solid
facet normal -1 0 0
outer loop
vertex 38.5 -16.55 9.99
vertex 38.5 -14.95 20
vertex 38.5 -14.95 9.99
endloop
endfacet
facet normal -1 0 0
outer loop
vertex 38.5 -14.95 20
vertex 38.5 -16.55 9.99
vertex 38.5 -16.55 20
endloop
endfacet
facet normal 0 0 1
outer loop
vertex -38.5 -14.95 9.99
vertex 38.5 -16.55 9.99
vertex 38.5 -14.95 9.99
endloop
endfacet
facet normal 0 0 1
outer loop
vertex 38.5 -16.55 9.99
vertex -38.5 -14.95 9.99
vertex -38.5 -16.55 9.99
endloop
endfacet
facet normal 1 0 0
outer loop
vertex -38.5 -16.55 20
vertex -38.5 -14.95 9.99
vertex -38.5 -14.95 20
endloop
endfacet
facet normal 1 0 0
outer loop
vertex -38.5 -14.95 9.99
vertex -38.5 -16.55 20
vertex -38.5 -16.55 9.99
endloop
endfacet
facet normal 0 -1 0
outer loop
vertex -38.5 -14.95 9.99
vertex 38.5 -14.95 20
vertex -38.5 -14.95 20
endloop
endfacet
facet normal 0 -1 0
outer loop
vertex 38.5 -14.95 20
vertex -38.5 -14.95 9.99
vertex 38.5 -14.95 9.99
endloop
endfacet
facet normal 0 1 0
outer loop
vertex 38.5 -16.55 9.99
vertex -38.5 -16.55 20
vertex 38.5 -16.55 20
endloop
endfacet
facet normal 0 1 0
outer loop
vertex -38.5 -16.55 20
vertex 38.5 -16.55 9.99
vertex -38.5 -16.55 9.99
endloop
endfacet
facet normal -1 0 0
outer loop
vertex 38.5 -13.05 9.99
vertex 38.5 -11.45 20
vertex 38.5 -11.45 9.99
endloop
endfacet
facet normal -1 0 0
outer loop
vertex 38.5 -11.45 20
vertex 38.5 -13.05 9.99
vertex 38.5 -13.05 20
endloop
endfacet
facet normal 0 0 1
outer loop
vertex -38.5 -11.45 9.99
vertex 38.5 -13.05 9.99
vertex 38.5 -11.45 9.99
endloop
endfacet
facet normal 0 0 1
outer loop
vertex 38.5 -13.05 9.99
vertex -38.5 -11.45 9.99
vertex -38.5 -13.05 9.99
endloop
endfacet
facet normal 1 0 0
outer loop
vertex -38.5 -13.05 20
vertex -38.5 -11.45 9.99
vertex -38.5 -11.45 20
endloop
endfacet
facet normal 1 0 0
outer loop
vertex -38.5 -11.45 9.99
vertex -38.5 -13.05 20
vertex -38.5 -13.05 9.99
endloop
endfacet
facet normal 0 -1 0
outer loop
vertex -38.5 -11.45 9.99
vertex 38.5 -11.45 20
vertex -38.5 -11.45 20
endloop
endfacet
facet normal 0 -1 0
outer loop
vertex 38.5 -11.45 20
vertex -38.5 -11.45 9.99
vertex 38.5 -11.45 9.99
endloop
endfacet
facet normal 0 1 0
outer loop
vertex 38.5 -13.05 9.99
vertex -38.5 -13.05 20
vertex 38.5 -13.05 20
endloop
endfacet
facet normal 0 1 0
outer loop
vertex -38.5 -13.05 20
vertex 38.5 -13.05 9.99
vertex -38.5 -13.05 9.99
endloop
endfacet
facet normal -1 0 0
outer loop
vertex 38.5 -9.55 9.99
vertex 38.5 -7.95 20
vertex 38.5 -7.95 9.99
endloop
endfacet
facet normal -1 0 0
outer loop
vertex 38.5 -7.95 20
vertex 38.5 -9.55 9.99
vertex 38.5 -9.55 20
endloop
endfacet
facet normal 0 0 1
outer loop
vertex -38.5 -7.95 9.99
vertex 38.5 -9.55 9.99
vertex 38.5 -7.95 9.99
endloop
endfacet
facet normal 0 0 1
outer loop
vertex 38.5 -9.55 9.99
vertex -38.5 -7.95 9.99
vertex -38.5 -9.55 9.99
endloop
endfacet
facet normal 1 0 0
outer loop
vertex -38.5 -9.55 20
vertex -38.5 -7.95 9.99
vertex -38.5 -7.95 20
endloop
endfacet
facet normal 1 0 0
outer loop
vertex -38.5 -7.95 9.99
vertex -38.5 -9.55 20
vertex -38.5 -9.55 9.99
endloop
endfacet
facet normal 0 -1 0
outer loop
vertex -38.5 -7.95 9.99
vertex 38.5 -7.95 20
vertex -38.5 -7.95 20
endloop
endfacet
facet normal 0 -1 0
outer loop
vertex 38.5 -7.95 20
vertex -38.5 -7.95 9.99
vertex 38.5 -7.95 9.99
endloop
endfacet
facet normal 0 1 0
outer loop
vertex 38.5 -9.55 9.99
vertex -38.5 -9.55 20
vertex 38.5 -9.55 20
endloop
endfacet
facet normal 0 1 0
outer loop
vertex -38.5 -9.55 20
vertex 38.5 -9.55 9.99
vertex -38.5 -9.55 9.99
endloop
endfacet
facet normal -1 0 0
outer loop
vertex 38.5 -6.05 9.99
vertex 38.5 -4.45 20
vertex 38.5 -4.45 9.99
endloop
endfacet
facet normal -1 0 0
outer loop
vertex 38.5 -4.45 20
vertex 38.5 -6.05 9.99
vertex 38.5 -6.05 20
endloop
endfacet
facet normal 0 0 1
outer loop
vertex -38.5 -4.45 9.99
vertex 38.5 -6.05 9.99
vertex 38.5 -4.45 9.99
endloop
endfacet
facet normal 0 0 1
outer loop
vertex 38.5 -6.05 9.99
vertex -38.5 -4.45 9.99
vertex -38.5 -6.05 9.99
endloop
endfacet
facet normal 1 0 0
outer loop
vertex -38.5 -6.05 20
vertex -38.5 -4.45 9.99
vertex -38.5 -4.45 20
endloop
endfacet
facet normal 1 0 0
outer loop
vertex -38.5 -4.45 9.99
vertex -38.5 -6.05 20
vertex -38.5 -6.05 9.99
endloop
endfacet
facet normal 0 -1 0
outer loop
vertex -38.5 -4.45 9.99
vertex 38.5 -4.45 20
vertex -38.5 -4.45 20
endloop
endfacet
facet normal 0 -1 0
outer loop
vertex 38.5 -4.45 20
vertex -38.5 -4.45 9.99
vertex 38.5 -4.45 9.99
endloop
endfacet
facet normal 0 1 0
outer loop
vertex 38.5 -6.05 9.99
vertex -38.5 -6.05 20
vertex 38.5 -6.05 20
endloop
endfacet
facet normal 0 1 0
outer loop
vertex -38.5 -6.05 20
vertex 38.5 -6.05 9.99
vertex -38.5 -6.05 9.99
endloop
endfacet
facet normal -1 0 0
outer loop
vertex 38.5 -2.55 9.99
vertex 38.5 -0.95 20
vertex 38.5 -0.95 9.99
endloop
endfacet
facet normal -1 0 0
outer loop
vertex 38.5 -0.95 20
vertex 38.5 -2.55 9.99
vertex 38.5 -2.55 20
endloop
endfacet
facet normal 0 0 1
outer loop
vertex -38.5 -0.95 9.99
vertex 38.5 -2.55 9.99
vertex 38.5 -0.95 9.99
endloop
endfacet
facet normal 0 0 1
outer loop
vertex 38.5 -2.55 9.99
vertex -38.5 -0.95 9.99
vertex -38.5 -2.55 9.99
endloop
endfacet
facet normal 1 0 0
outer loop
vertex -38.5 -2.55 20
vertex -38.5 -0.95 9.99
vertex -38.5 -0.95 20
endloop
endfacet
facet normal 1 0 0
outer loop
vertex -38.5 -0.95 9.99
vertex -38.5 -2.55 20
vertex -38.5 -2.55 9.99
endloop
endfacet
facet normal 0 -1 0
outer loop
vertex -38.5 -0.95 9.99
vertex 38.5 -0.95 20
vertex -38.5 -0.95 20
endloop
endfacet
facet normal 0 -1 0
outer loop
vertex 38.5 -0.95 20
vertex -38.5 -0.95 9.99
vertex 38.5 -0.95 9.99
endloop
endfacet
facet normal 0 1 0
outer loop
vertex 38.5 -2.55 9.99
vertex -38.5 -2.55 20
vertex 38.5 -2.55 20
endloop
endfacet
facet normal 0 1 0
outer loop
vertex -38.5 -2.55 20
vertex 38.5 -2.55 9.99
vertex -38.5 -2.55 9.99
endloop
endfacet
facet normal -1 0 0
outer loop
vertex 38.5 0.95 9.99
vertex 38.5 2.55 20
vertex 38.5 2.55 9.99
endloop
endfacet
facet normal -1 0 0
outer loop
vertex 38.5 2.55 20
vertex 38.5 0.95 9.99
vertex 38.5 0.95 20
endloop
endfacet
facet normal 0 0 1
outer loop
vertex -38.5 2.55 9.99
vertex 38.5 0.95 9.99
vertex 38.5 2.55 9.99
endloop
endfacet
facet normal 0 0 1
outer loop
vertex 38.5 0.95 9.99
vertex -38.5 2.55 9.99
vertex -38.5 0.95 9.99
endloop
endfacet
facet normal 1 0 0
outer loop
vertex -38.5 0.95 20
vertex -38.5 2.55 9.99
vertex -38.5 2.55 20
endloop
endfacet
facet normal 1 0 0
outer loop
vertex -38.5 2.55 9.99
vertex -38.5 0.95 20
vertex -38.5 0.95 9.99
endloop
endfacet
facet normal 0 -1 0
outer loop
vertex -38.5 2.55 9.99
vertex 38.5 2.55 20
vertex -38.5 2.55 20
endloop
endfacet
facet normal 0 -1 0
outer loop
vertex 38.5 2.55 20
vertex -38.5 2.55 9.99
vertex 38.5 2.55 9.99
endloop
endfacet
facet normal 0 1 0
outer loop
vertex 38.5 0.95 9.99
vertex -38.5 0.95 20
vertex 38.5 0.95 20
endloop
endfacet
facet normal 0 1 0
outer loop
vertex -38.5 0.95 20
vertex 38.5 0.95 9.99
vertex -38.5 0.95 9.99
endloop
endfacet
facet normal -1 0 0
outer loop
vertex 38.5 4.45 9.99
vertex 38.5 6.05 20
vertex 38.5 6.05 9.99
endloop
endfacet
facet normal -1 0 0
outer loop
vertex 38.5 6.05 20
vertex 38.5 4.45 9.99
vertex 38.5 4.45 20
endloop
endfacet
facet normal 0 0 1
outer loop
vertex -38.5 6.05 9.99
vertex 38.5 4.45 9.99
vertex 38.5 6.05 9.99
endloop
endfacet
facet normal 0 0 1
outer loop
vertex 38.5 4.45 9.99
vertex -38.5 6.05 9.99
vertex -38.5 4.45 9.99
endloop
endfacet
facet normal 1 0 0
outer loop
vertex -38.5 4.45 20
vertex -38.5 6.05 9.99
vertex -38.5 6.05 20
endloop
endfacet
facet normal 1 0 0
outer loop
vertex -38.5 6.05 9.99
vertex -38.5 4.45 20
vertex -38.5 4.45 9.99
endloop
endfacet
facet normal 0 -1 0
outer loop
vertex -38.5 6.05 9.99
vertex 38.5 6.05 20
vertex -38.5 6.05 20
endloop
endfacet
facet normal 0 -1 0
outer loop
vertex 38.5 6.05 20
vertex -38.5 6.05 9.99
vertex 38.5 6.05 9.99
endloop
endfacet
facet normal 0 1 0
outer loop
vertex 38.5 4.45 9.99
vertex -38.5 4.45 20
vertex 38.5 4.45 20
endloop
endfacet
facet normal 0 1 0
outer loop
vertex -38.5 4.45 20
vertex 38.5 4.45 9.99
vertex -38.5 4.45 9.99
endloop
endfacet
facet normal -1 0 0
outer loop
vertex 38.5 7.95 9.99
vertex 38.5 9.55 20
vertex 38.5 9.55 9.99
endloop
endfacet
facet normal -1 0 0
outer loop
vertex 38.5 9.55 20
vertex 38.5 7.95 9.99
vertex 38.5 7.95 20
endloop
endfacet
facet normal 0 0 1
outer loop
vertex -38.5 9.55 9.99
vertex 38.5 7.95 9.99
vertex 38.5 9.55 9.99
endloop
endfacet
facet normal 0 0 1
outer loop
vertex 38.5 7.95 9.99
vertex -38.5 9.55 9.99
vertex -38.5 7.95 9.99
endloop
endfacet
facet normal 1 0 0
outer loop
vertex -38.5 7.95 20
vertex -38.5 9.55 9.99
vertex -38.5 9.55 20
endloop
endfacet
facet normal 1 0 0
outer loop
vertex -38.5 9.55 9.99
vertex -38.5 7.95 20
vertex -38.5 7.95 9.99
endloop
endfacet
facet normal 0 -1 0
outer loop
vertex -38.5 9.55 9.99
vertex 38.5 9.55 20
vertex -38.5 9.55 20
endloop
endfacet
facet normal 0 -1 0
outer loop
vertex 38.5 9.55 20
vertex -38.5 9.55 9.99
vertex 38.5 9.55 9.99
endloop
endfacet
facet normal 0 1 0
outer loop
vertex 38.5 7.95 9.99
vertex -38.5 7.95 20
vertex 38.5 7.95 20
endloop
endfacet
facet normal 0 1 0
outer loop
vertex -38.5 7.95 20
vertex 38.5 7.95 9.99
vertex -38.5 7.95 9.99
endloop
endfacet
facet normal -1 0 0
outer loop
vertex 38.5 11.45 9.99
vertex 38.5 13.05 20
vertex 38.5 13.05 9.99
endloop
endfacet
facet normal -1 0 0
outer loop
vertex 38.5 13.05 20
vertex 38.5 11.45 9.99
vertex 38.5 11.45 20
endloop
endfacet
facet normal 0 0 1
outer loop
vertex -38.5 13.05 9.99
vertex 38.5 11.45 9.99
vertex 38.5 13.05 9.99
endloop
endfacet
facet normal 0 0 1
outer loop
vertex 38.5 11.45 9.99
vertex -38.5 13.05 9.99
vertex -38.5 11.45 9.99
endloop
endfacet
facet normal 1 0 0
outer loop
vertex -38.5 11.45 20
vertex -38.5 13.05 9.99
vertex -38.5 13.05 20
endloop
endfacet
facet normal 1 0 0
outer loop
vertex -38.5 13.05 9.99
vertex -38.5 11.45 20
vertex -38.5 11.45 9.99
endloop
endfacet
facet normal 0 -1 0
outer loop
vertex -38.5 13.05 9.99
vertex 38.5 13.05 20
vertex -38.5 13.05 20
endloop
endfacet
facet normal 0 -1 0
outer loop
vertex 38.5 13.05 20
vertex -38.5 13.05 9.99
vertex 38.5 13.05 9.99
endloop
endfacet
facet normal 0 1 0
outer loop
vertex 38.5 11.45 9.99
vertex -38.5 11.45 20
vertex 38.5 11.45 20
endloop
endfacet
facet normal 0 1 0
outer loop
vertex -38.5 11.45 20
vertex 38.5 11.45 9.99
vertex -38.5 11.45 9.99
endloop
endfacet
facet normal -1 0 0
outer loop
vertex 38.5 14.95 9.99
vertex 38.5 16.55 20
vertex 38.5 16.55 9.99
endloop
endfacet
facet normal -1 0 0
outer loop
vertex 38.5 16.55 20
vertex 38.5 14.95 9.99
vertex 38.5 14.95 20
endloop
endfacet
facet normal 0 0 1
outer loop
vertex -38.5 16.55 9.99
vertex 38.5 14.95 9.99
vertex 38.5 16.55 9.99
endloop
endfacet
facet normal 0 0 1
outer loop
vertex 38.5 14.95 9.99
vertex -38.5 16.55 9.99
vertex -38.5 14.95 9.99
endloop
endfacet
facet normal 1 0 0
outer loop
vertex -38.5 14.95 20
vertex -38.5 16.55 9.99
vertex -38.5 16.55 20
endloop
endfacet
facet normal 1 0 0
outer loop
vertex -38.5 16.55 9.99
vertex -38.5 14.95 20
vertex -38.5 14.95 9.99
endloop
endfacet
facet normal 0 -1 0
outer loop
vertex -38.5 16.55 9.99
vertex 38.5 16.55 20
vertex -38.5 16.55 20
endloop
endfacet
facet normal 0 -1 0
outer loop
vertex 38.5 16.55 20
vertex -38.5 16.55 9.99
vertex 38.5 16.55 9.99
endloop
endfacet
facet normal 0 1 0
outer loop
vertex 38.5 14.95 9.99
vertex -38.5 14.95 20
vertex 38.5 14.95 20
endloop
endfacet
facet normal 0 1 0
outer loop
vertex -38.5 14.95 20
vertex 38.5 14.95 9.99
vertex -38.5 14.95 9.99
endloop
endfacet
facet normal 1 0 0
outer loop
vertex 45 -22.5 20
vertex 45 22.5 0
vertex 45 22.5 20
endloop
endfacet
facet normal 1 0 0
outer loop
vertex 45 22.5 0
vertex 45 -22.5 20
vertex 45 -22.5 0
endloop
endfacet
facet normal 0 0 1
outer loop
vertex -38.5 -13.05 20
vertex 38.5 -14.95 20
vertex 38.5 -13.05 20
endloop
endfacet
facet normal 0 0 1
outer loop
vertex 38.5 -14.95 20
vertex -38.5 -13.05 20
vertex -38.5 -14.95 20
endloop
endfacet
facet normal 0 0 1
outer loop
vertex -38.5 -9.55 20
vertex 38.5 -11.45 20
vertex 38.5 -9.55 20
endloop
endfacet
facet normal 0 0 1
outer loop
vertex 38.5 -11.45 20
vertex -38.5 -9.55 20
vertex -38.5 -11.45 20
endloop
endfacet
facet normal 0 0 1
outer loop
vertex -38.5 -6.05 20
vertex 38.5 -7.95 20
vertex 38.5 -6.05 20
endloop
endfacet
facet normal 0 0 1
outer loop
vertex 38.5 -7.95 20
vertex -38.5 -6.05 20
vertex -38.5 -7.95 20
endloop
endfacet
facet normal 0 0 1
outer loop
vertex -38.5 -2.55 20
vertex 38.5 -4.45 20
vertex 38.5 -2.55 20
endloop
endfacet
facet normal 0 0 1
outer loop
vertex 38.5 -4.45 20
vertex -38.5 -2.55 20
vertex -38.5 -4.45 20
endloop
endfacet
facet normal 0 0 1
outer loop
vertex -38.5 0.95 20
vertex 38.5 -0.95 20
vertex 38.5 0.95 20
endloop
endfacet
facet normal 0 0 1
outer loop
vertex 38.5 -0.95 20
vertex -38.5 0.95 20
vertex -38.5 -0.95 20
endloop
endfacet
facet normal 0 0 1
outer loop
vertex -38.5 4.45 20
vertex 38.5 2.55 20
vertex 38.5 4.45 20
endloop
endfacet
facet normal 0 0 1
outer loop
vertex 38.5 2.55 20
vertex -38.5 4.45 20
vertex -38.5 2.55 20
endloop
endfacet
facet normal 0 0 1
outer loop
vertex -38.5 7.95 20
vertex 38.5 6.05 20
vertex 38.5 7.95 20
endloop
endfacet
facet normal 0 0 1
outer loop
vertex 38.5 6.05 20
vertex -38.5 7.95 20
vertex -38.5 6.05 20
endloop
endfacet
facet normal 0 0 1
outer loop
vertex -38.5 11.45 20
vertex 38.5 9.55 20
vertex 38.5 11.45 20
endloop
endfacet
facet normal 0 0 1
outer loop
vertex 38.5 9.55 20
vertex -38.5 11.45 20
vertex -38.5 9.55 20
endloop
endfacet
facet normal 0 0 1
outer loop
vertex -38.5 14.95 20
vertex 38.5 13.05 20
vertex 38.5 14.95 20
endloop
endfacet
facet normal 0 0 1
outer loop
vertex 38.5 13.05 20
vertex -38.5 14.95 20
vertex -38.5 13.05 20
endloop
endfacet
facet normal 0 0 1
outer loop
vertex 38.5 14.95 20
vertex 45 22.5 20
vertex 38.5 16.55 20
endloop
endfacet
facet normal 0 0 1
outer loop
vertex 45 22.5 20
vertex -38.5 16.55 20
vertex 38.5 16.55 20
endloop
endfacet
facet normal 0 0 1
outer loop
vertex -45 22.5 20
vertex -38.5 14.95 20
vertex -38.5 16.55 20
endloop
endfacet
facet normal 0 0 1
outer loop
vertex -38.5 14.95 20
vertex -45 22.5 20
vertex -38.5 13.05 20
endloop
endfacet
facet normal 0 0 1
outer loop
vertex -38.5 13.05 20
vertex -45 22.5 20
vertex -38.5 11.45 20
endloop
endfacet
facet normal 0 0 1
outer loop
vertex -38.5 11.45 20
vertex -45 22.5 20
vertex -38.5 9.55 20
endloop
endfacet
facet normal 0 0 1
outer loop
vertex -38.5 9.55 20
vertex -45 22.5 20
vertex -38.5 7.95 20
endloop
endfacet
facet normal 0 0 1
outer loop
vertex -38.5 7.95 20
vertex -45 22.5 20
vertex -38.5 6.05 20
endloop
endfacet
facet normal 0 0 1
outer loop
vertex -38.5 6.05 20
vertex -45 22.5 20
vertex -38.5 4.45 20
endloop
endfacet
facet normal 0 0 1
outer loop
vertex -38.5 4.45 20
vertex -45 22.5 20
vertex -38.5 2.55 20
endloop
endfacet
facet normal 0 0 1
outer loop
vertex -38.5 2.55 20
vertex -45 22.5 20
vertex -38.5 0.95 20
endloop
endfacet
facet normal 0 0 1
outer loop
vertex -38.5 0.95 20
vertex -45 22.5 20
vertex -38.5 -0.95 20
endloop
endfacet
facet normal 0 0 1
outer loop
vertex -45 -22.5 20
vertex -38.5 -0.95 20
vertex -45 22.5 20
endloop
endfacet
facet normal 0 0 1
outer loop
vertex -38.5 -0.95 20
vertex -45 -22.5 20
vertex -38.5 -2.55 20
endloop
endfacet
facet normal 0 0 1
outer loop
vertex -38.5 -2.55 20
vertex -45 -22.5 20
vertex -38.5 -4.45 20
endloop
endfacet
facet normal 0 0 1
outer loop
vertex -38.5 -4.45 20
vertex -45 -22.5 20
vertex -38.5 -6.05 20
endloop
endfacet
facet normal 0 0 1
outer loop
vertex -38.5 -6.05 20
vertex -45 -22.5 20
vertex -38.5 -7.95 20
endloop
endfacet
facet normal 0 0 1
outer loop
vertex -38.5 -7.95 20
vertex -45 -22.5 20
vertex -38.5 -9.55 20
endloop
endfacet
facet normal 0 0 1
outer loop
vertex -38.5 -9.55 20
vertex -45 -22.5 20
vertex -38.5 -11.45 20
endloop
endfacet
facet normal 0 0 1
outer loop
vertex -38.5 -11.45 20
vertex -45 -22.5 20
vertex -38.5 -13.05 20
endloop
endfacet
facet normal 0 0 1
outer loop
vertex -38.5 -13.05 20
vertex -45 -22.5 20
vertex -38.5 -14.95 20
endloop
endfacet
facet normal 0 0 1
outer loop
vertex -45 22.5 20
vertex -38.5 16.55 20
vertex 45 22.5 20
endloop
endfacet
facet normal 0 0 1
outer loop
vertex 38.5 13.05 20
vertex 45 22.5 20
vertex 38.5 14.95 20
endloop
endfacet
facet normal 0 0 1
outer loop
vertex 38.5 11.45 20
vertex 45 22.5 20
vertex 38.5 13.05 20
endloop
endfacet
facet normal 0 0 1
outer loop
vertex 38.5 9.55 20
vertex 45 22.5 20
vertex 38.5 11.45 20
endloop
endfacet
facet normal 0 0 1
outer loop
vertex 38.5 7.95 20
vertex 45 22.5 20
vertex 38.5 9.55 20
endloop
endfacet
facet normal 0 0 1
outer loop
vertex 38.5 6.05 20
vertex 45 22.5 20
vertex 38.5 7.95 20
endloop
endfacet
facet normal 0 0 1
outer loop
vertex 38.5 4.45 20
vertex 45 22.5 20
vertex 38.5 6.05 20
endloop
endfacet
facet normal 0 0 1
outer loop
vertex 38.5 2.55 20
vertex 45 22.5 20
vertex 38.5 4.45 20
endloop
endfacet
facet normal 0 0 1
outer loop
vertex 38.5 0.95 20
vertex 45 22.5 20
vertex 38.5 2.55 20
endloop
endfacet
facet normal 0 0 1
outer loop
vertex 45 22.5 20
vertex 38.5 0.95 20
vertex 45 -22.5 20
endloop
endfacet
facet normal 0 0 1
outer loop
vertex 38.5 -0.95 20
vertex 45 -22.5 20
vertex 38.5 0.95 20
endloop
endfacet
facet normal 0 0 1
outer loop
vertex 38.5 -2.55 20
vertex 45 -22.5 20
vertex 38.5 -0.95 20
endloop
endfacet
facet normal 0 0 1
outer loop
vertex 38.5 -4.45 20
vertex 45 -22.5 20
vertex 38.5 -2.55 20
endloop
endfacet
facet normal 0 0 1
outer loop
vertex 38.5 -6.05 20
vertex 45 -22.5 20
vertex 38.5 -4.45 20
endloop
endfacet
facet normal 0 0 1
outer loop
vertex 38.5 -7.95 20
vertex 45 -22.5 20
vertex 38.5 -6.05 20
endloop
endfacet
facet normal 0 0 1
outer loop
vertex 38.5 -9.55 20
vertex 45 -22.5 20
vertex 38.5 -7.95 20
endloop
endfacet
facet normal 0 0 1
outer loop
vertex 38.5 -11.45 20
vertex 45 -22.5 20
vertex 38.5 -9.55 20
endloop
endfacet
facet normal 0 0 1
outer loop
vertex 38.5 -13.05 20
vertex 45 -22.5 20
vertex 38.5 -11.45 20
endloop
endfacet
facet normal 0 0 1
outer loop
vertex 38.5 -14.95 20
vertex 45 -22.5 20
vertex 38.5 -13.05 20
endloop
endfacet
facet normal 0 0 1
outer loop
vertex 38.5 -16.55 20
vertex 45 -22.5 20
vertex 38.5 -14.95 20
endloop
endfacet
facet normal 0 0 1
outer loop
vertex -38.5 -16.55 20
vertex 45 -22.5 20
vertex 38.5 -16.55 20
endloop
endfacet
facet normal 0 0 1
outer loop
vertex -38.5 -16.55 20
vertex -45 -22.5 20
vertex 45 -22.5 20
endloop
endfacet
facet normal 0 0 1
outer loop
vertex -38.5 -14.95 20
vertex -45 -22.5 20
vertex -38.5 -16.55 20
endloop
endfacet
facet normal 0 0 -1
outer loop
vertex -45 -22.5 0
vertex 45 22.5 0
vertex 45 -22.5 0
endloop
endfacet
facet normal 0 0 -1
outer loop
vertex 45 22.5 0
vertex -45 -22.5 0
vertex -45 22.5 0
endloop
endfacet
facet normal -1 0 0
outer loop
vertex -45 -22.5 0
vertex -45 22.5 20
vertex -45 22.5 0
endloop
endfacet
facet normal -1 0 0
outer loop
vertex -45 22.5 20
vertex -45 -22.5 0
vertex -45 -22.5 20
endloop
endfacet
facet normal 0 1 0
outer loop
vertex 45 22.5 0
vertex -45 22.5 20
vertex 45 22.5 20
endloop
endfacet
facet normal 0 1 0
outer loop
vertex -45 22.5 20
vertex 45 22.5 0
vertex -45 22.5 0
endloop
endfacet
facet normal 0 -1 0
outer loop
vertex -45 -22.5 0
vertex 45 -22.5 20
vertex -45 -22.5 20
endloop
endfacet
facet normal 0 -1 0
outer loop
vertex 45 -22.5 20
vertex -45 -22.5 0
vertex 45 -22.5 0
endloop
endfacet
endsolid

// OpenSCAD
// Drying rack for 10 microscope slides
// Units: millimetres

// --- Base Block Dimensions ---
base_length = 90;      // X dimension
base_width = 45;        // Y dimension
base_height = 20;      // Z dimension

// --- Slide Dimensions ---
slide_length = 75;     // Length of slide (fits in slot)
slide_width = 25;      // Width of slide (fits in slot)
slide_thickness = 1; // Thickness of slide

// --- Slot Dimensions ---
slot_length = 77;      // Length of slot (X)
slot_width = 1.6;      // Width of slot (Y)
slot_depth = 10;     // Depth of slot (Z)

// --- Slot Layout ---
slot_count = 10;       // Number of slots
slot_spacing = 3.5;    // Centre-to-centre spacing (Y)

// --- Calculated Layout ---
// Total width occupied by 10 slots at 3.5mm pitch: (10-1) * 3.5 = 31.5mm
// Center of the group is at 0.
// First slot center: - (9 * 3.5) / 2 = -15.75
// Last slot center: + 15.75
// Check clearance: 15.75 + (slot_width/2) = 15.75 + 0.8 = 16.55 < 22.5 (half base width). OK.

// --- Construction ---

module drying_rack() {
    // 1. Create the solid base block
    // Centered at origin (0,0,0) in X and Y.
    // Bottom face at Z = 0, Top face at Z = base_height.
    // We use a difference to cut the slots.
    difference() {
        // Base block
        // Translate so bottom is at Z=0
        translate([0, 0, base_height / 2]) {
            cube([base_length, base_width, base_height], center = true);
        }
        
        // 2. Cut the 10 parallel slots
        // Slots run along X, centered in X.
        // Slots are cut from the top face (Z = base_height) downwards.
        for (i = [0 : slot_count - 1]) {
            // Calculate Y position for this slot
            // Center of the group is 0.
            // Spacing is slot_spacing.
            slot_y = (i - (slot_count - 1) / 2) * slot_spacing;
            
            // Slot geometry
            // X: Centered, length 77mm
            // Y: Calculated above
            // Z: Starts at top of base, goes down 10mm.
            
            // To ensure no coplanar faces, we extend the cutting shape slightly past the faces.
            // Intended slot Z range: [base_height - slot_depth, base_height]
            // i.e., [10, 20].
            // Cut cube Z range: [10 - 0.01, 20 + 0.01] -> [9.99, 20.01]
            // Cut cube center Z = (9.99 + 20.01) / 2 = 15.0.
            // Base top is 20. Base bottom is 0.
            
            cut_x_len = slot_length;
            cut_y_len = slot_width;
            cut_z_len = slot_depth + 0.02; // Extend 0.02mm past the bottom of the slot
            
            // Position
            cut_x_pos = 0;
            cut_y_pos = slot_y;
            // Center Z: (base_height - slot_depth) + (slot_depth / 2) + 0.01
            // = base_height - slot_depth/2 + 0.01
            // = 20 - 5 + 0.01 = 15.01
            // Wait, simpler: Center of the cut volume.
            // Cut volume Z: [9.99, 20.01]. Center = 15.0.
            // Base top = 20.
            // Let's just use the center of the slot + offset.
            // Slot center Z = 20 - 5 = 15.
            // Cut cube center Z = 15.0.
            cut_z_pos = base_height - slot_depth / 2;
            
            // Actually, to be safe with the "extend past faces" rule:
            // Top face of base is at 20. Cut must go past 20.
            // Bottom of slot is at 10. Cut must go past 10.
            // Cut cube Z range: [10 - 0.01, 20 + 0.01] = [9.99, 20.01].
            // Center Z = 15.0.
            // Height = 10.02.
            
            translate([cut_x_pos, cut_y_pos, cut_z_pos]) {
                cube([cut_x_len, cut_y_len, cut_z_len], center = true);
            }
        }
    }
}

drying_rack();
